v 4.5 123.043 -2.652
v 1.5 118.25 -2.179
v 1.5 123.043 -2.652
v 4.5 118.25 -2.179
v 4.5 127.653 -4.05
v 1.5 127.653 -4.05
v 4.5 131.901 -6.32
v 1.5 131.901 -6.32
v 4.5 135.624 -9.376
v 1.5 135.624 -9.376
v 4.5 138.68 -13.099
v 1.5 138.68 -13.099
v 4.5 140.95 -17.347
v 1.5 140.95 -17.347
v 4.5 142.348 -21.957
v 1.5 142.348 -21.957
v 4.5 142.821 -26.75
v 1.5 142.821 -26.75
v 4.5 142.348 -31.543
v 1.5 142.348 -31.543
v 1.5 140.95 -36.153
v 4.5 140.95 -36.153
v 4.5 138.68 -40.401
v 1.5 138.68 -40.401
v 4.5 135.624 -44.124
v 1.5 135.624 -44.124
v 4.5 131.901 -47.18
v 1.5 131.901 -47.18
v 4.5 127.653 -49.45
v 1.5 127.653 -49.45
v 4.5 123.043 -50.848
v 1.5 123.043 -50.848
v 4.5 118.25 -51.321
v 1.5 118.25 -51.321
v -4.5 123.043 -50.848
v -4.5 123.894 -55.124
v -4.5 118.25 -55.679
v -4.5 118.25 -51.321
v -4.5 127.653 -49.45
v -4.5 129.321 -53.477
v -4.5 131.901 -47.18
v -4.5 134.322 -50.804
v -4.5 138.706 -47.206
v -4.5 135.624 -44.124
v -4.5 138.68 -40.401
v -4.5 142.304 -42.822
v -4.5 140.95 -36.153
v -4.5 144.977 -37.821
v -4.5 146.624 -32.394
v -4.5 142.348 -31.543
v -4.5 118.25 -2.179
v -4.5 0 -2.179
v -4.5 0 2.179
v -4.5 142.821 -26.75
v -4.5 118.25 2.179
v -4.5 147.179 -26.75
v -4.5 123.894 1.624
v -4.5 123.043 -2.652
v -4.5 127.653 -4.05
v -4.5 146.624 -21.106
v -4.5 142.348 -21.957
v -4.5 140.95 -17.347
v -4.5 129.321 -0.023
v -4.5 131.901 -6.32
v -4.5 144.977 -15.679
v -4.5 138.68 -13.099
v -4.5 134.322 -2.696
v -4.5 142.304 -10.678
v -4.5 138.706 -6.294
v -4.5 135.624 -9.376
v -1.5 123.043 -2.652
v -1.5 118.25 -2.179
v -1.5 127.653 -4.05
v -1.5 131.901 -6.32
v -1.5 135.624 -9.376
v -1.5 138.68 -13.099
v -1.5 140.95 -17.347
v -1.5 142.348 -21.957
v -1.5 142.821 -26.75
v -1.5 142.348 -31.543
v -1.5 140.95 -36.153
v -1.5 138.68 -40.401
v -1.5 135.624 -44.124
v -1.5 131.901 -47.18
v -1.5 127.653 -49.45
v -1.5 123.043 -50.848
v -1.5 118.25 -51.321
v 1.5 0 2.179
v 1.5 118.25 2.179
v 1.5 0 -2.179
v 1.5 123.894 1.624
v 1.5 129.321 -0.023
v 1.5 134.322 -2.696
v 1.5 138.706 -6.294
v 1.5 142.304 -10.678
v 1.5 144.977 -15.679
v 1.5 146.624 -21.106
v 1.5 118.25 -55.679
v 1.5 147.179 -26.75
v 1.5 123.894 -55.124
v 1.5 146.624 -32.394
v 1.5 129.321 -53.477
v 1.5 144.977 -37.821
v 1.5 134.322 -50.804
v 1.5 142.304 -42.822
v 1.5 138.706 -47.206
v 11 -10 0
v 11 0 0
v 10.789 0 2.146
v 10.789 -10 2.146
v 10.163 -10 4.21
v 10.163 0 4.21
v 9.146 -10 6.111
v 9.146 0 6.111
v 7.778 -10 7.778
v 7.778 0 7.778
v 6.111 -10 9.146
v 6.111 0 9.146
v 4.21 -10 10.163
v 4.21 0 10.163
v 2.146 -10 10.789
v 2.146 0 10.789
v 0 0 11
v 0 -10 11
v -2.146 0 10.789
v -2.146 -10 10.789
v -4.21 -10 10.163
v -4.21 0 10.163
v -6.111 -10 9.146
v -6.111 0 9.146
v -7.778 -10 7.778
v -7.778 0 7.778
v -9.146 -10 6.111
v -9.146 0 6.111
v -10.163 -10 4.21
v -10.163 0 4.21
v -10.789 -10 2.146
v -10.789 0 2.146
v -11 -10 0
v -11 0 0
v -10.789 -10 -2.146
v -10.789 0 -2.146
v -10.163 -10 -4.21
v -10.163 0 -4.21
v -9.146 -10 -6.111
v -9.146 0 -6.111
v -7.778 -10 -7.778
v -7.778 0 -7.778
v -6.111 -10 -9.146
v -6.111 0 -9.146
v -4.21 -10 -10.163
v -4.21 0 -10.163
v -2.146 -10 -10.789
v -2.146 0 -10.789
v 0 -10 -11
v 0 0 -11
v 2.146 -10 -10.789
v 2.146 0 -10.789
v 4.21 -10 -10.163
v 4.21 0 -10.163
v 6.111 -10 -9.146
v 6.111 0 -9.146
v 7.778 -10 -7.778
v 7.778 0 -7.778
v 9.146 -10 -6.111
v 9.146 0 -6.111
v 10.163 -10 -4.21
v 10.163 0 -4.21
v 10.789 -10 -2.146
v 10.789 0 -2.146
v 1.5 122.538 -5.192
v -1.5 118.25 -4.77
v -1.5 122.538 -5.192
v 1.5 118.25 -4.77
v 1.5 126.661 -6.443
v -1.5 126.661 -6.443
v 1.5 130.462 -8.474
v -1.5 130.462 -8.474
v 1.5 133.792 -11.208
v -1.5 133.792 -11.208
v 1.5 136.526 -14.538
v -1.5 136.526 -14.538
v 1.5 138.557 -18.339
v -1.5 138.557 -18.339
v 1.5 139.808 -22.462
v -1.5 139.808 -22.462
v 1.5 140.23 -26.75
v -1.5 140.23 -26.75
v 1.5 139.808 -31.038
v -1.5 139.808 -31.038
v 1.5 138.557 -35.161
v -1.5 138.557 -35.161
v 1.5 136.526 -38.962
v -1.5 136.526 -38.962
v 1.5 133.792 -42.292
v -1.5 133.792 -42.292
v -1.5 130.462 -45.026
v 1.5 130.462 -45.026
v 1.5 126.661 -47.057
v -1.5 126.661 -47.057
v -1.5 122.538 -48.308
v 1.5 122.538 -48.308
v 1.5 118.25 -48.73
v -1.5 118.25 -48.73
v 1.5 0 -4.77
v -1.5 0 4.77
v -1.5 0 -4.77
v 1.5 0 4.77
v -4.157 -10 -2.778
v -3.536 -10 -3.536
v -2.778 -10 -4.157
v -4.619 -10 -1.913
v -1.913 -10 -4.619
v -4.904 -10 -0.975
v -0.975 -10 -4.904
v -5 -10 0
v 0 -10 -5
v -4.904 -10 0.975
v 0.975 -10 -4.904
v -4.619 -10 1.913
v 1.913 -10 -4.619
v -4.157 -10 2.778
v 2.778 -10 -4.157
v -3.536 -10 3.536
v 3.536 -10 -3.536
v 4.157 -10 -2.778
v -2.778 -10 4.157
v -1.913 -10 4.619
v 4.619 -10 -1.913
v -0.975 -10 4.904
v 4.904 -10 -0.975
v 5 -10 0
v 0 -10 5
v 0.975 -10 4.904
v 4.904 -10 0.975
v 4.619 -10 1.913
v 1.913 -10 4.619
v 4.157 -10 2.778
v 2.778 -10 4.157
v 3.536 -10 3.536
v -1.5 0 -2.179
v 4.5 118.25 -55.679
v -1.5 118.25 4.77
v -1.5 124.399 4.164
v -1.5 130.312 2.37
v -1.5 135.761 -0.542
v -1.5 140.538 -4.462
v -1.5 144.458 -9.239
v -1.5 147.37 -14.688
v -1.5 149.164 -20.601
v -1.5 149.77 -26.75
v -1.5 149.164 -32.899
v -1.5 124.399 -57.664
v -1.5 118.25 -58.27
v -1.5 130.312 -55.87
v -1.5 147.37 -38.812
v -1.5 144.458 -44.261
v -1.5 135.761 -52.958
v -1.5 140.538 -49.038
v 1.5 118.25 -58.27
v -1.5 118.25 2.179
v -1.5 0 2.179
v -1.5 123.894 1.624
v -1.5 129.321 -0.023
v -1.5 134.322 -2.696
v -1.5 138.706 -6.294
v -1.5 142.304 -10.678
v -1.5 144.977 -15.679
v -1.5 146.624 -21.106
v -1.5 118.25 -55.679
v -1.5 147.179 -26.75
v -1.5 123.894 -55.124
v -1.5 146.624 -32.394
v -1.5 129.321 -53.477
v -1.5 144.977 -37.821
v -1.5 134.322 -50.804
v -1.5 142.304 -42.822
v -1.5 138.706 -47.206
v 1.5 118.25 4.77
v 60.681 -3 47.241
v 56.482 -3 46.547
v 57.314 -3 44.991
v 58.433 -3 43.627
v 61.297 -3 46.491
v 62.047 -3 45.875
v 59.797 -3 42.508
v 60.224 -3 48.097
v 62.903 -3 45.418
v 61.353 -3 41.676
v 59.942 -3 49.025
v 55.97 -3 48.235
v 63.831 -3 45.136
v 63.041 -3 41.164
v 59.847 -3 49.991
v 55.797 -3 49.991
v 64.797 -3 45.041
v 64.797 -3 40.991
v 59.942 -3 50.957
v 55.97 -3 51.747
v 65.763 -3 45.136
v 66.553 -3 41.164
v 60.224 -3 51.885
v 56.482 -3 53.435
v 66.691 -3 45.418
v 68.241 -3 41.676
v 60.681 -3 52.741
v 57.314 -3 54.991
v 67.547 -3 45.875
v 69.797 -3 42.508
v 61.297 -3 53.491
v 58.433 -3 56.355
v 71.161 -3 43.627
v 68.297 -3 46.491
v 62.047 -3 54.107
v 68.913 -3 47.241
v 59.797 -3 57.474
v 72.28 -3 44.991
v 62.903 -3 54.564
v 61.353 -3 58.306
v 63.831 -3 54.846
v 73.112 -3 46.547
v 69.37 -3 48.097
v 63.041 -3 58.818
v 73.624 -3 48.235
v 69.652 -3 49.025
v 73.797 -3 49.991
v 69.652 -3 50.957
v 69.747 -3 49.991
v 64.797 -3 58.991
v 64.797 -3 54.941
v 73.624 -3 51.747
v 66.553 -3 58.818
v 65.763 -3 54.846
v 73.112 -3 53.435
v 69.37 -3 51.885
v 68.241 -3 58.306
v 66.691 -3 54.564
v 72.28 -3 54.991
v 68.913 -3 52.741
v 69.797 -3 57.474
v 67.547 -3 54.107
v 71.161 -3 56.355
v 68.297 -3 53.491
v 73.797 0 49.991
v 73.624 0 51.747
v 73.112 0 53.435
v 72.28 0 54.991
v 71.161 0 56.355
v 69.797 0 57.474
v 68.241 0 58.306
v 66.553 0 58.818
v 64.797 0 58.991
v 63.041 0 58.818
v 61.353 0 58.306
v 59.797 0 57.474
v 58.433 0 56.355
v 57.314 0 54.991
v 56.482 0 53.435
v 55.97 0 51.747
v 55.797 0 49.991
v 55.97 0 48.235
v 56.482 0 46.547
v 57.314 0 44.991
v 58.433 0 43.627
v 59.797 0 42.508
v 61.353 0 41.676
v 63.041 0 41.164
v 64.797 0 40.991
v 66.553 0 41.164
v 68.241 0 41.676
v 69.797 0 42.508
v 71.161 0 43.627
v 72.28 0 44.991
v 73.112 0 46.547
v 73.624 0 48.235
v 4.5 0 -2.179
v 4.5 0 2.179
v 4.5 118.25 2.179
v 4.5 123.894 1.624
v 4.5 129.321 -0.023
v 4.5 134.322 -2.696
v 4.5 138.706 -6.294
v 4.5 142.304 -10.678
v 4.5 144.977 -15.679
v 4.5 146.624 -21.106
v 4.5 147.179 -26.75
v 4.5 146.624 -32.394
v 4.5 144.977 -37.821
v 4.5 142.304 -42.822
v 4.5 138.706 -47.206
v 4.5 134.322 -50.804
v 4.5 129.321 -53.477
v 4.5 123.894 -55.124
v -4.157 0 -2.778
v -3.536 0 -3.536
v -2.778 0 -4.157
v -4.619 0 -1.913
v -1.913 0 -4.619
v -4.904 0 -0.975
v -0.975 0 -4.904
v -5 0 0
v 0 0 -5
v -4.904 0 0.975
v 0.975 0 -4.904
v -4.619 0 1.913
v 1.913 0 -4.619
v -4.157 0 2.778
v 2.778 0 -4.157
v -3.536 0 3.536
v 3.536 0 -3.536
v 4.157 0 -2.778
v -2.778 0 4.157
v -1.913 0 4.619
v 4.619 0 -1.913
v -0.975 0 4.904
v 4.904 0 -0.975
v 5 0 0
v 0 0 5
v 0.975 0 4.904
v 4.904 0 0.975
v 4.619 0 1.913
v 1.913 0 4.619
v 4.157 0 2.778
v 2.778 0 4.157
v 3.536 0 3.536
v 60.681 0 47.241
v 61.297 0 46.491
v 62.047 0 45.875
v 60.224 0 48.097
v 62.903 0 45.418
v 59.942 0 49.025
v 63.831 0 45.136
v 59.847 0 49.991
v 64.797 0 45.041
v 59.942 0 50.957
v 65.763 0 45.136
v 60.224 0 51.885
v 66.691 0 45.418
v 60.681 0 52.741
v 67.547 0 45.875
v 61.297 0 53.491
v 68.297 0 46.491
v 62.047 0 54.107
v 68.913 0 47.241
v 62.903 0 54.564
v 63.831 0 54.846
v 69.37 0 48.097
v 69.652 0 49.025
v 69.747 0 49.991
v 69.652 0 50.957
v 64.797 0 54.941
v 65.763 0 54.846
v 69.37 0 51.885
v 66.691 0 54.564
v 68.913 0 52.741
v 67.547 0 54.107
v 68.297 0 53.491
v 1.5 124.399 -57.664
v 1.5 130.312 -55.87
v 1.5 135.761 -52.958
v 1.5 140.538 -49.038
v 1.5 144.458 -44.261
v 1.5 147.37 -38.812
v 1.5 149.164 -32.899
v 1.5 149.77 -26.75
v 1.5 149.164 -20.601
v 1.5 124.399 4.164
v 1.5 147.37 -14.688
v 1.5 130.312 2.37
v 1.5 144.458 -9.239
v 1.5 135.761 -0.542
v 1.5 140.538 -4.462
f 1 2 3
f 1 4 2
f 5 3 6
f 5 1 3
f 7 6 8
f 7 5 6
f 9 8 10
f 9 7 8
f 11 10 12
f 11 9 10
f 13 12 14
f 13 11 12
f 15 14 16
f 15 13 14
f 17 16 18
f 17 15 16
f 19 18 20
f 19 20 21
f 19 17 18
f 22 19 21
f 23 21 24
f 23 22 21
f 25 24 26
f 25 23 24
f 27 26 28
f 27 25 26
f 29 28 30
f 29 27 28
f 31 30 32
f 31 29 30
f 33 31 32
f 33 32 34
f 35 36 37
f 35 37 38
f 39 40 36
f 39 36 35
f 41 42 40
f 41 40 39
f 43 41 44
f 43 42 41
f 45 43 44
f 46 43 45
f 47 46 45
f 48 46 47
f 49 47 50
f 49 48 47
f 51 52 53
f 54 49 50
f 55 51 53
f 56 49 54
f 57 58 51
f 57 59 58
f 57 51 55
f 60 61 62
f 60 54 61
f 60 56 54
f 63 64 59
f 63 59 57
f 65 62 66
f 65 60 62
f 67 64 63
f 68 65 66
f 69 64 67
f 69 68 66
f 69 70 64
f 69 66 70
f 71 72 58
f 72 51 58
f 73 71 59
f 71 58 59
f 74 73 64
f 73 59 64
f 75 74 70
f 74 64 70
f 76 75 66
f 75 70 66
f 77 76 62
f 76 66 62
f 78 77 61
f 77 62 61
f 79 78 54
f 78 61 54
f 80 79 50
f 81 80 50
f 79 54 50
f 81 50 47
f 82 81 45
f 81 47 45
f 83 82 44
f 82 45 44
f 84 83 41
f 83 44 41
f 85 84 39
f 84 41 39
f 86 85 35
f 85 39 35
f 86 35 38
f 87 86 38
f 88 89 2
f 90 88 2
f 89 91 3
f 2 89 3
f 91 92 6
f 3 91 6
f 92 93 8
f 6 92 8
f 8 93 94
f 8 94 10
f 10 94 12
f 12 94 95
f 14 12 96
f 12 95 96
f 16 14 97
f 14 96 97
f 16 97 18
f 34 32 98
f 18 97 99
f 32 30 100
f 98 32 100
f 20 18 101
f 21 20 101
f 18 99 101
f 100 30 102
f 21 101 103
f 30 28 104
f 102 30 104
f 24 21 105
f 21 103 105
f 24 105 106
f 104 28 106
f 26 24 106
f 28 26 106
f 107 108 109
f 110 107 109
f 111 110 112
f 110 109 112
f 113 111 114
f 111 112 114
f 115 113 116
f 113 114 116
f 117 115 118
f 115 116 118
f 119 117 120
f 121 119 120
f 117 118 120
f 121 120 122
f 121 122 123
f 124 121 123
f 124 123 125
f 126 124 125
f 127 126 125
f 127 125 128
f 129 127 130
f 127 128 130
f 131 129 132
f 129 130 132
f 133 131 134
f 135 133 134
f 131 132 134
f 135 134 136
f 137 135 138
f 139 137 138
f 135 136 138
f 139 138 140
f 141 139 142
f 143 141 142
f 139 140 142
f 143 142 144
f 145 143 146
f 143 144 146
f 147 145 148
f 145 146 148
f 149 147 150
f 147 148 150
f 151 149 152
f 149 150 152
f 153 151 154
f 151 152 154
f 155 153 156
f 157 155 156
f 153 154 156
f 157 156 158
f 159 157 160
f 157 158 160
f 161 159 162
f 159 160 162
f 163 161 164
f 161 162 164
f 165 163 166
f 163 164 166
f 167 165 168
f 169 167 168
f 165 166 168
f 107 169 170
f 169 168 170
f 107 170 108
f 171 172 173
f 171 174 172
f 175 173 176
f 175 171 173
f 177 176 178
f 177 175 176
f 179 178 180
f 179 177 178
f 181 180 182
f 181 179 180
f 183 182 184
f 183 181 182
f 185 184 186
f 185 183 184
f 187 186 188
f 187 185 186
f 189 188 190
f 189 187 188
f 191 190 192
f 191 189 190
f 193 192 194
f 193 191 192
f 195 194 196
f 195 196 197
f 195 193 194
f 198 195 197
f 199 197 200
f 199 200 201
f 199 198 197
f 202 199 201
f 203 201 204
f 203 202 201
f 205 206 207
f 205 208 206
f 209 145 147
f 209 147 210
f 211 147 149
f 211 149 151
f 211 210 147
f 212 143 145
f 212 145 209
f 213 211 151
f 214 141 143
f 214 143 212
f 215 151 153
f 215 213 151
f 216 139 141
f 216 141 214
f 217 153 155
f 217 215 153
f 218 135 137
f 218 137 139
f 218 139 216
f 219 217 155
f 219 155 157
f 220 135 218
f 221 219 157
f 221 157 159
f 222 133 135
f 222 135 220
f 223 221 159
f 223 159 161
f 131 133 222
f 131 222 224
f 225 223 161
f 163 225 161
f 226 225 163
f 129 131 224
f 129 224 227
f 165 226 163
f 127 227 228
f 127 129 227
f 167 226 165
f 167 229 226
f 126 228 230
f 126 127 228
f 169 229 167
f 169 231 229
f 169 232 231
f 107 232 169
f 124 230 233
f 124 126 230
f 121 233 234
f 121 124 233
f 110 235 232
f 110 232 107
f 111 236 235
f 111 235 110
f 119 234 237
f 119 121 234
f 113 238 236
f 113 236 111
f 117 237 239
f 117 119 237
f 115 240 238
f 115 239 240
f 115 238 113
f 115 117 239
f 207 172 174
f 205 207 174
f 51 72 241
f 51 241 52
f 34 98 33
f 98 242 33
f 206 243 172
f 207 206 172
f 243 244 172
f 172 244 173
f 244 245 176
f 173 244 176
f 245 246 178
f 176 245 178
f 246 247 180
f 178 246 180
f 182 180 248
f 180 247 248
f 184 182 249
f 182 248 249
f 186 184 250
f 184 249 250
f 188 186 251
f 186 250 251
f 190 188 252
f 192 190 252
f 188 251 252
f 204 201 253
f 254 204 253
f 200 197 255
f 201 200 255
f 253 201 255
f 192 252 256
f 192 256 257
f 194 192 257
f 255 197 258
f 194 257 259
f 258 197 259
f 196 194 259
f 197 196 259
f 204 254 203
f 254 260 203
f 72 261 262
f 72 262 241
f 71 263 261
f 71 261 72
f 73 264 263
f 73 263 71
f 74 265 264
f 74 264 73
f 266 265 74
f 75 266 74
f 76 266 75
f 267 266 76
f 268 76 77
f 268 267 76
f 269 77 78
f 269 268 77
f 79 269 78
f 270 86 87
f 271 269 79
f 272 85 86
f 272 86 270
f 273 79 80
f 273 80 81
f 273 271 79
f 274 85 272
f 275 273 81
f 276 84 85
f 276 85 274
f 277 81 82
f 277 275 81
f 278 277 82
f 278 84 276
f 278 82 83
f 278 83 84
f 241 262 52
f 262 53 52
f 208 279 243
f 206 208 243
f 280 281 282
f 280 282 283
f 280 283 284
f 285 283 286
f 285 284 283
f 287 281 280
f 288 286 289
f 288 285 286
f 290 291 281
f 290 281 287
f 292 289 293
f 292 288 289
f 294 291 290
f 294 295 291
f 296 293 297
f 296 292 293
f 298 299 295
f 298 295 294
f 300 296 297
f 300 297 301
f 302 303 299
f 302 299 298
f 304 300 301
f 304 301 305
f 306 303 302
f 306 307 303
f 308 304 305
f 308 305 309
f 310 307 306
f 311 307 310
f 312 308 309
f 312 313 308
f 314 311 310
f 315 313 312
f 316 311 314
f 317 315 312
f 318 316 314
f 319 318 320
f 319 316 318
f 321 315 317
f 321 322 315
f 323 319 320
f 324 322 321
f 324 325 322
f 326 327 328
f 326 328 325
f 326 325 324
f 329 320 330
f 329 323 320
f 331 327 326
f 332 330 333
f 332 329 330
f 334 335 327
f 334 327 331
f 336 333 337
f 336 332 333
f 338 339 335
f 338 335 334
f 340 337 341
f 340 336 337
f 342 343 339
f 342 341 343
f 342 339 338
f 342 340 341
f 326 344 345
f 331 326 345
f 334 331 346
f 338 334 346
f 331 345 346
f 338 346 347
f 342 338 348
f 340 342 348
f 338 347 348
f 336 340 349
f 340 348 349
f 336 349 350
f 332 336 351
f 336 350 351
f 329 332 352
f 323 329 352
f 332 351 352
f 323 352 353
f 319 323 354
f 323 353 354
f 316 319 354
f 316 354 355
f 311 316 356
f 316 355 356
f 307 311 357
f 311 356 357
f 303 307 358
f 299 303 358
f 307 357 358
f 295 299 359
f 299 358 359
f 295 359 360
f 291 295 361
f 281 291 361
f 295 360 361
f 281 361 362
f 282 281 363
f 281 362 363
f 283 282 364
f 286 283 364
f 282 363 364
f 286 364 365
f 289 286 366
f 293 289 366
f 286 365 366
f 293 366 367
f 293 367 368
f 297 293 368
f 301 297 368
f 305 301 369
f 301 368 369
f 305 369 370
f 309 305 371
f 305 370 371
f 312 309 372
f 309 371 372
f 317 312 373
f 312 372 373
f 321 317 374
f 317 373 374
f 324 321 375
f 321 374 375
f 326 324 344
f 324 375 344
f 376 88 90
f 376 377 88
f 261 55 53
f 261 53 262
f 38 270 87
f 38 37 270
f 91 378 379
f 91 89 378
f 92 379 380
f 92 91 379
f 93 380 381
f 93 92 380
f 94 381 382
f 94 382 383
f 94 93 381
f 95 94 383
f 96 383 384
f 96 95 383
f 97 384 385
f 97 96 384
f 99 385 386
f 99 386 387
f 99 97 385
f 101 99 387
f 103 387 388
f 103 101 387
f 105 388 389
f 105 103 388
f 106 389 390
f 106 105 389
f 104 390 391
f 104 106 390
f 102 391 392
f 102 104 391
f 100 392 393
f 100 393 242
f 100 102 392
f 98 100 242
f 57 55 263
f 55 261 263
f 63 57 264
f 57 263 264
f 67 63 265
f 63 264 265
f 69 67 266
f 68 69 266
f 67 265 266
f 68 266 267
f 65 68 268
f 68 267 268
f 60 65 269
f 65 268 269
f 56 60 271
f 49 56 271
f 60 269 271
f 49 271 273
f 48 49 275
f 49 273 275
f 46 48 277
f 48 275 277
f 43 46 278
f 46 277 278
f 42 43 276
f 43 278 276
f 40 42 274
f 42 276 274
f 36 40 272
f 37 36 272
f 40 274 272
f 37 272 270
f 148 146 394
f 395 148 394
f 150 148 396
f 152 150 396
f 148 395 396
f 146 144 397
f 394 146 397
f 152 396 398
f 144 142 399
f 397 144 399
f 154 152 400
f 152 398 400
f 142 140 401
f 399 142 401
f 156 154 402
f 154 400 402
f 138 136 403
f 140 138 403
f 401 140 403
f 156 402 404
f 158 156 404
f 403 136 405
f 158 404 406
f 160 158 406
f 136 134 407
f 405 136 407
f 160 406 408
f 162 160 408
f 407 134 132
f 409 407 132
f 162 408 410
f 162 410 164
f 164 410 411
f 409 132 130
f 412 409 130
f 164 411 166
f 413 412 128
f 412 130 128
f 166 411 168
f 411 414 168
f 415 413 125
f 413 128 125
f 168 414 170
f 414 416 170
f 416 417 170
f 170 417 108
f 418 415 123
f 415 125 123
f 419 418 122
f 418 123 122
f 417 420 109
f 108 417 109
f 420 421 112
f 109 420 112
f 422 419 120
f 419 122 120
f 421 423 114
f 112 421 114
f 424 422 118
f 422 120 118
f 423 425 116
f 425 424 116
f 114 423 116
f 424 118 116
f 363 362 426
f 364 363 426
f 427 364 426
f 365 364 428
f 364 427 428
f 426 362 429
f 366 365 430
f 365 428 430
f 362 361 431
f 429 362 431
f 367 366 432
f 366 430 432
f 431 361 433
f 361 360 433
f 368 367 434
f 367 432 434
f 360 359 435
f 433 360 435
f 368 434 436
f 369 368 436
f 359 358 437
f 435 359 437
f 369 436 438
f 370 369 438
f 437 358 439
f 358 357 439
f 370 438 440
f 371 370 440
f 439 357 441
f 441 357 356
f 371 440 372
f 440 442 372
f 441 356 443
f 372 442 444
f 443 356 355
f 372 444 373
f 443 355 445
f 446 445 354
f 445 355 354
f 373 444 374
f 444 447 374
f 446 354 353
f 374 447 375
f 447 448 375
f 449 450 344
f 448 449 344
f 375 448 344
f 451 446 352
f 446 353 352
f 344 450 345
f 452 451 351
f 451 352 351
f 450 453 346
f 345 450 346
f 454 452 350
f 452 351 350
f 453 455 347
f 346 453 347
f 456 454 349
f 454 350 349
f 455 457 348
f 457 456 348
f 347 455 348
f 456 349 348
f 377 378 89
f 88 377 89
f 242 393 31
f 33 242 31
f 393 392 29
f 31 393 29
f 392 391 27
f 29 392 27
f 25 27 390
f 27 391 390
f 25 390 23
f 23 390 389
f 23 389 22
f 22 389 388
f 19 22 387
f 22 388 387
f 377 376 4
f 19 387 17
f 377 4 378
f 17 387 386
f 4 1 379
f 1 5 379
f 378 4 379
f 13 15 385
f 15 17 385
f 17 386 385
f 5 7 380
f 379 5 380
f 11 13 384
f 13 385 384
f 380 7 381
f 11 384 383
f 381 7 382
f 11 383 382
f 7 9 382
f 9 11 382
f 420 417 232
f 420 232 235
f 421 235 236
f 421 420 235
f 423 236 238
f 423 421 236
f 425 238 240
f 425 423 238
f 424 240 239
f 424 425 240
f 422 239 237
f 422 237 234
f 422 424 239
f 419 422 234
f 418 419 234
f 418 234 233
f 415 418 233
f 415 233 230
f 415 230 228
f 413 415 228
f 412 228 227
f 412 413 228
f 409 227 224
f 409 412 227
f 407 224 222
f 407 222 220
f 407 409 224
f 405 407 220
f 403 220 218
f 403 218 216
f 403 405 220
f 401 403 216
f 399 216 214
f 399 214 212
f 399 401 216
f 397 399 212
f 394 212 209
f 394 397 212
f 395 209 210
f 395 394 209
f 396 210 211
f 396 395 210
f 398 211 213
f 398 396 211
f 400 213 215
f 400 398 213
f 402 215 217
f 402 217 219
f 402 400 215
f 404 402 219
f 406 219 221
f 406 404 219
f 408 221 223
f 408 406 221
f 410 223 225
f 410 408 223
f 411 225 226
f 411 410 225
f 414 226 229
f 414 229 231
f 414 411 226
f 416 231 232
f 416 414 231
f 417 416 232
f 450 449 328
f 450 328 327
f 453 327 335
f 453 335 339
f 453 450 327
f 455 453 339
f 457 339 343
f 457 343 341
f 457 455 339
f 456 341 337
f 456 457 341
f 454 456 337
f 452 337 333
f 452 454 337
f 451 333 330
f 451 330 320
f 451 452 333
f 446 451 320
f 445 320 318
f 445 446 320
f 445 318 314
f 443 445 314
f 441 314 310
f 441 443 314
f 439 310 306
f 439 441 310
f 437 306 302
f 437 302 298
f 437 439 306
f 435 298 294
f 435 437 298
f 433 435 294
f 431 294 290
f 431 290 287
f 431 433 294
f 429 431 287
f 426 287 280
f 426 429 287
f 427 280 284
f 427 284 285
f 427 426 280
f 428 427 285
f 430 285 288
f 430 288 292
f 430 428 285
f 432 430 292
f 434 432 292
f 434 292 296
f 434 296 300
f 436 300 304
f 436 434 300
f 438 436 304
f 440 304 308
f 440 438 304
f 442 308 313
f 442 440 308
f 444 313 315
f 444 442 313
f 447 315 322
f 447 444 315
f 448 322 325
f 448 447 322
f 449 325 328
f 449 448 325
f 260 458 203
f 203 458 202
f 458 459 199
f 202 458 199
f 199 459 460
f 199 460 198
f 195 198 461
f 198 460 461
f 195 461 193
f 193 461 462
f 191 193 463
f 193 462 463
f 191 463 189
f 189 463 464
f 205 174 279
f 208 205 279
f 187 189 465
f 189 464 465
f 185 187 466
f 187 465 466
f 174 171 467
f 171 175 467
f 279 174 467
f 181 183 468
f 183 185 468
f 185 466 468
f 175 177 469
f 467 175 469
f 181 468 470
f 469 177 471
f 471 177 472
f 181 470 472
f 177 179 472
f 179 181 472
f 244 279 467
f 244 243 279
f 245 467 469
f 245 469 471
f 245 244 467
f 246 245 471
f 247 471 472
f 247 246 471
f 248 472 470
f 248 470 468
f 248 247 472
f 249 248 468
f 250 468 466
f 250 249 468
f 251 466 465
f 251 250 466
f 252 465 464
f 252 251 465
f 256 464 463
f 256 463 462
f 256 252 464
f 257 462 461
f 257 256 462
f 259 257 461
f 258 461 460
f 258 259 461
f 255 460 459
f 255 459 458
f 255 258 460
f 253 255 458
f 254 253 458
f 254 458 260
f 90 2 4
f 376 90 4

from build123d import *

# Parameters (mm, degrees)
F0_R     = 11
F0_R_2   = 5
F1_DEPTH = 10
F2_W     = 3
F2_H     = 9.5393920142
F3_W     = 3
F3_H     = 4.3588989435
F8_R     = 9
F8_R_2   = 4.95
F9_DEPTH = 3


with BuildPart() as f1:
    # F0 (on Front) → F1 (new body)
    with BuildSketch(Plane.XZ):
        Circle(F0_R)
        Circle(F0_R_2, mode=Mode.SUBTRACT)
    extrude(amount=F1_DEPTH)


with BuildPart() as f5:
    # F5: sweep along a path in F4
    with BuildLine(Plane.YZ) as f5_path:
        Line((0, 0), (118.25, 0))
        ThreePointArc((118.25, 0), (145, -26.75), (118.25, -53.5))
    # F2 (on Front) → F5 (sweep)
    with BuildSketch(Plane.XZ):
        Rectangle(F2_W, F2_H)
    sweep(path=f5_path.line)


with BuildPart() as f6:
    # F6: sweep along a path in F4
    with BuildLine(Plane.YZ) as f6_path:
        Line((0, 0), (118.25, 0))
        ThreePointArc((118.25, 0), (145, -26.75), (118.25, -53.5))
    # F3 (on Front) → F6 (sweep)
    with BuildSketch(Plane.XZ):
        with Locations((3, 0)):
            Rectangle(F3_W, F3_H)
    sweep(path=f6_path.line)


with BuildPart() as f7_1:
    # F7: instance of F6
    add(f6.part.mirror(Plane.YZ))


with BuildPart() as f9:
    # F8 (on Front) → F9 (new body)
    with BuildSketch(Plane.XZ):
        with Locations((64.7970363498, 49.9910265207)):
            Circle(F8_R)
        with Locations((64.7970363498, 49.9910265207)):
            Circle(F8_R_2, mode=Mode.SUBTRACT)
    extrude(amount=F9_DEPTH)


solid = Compound([f1.part, f5.part, f6.part, f7_1.part, f9.part])
